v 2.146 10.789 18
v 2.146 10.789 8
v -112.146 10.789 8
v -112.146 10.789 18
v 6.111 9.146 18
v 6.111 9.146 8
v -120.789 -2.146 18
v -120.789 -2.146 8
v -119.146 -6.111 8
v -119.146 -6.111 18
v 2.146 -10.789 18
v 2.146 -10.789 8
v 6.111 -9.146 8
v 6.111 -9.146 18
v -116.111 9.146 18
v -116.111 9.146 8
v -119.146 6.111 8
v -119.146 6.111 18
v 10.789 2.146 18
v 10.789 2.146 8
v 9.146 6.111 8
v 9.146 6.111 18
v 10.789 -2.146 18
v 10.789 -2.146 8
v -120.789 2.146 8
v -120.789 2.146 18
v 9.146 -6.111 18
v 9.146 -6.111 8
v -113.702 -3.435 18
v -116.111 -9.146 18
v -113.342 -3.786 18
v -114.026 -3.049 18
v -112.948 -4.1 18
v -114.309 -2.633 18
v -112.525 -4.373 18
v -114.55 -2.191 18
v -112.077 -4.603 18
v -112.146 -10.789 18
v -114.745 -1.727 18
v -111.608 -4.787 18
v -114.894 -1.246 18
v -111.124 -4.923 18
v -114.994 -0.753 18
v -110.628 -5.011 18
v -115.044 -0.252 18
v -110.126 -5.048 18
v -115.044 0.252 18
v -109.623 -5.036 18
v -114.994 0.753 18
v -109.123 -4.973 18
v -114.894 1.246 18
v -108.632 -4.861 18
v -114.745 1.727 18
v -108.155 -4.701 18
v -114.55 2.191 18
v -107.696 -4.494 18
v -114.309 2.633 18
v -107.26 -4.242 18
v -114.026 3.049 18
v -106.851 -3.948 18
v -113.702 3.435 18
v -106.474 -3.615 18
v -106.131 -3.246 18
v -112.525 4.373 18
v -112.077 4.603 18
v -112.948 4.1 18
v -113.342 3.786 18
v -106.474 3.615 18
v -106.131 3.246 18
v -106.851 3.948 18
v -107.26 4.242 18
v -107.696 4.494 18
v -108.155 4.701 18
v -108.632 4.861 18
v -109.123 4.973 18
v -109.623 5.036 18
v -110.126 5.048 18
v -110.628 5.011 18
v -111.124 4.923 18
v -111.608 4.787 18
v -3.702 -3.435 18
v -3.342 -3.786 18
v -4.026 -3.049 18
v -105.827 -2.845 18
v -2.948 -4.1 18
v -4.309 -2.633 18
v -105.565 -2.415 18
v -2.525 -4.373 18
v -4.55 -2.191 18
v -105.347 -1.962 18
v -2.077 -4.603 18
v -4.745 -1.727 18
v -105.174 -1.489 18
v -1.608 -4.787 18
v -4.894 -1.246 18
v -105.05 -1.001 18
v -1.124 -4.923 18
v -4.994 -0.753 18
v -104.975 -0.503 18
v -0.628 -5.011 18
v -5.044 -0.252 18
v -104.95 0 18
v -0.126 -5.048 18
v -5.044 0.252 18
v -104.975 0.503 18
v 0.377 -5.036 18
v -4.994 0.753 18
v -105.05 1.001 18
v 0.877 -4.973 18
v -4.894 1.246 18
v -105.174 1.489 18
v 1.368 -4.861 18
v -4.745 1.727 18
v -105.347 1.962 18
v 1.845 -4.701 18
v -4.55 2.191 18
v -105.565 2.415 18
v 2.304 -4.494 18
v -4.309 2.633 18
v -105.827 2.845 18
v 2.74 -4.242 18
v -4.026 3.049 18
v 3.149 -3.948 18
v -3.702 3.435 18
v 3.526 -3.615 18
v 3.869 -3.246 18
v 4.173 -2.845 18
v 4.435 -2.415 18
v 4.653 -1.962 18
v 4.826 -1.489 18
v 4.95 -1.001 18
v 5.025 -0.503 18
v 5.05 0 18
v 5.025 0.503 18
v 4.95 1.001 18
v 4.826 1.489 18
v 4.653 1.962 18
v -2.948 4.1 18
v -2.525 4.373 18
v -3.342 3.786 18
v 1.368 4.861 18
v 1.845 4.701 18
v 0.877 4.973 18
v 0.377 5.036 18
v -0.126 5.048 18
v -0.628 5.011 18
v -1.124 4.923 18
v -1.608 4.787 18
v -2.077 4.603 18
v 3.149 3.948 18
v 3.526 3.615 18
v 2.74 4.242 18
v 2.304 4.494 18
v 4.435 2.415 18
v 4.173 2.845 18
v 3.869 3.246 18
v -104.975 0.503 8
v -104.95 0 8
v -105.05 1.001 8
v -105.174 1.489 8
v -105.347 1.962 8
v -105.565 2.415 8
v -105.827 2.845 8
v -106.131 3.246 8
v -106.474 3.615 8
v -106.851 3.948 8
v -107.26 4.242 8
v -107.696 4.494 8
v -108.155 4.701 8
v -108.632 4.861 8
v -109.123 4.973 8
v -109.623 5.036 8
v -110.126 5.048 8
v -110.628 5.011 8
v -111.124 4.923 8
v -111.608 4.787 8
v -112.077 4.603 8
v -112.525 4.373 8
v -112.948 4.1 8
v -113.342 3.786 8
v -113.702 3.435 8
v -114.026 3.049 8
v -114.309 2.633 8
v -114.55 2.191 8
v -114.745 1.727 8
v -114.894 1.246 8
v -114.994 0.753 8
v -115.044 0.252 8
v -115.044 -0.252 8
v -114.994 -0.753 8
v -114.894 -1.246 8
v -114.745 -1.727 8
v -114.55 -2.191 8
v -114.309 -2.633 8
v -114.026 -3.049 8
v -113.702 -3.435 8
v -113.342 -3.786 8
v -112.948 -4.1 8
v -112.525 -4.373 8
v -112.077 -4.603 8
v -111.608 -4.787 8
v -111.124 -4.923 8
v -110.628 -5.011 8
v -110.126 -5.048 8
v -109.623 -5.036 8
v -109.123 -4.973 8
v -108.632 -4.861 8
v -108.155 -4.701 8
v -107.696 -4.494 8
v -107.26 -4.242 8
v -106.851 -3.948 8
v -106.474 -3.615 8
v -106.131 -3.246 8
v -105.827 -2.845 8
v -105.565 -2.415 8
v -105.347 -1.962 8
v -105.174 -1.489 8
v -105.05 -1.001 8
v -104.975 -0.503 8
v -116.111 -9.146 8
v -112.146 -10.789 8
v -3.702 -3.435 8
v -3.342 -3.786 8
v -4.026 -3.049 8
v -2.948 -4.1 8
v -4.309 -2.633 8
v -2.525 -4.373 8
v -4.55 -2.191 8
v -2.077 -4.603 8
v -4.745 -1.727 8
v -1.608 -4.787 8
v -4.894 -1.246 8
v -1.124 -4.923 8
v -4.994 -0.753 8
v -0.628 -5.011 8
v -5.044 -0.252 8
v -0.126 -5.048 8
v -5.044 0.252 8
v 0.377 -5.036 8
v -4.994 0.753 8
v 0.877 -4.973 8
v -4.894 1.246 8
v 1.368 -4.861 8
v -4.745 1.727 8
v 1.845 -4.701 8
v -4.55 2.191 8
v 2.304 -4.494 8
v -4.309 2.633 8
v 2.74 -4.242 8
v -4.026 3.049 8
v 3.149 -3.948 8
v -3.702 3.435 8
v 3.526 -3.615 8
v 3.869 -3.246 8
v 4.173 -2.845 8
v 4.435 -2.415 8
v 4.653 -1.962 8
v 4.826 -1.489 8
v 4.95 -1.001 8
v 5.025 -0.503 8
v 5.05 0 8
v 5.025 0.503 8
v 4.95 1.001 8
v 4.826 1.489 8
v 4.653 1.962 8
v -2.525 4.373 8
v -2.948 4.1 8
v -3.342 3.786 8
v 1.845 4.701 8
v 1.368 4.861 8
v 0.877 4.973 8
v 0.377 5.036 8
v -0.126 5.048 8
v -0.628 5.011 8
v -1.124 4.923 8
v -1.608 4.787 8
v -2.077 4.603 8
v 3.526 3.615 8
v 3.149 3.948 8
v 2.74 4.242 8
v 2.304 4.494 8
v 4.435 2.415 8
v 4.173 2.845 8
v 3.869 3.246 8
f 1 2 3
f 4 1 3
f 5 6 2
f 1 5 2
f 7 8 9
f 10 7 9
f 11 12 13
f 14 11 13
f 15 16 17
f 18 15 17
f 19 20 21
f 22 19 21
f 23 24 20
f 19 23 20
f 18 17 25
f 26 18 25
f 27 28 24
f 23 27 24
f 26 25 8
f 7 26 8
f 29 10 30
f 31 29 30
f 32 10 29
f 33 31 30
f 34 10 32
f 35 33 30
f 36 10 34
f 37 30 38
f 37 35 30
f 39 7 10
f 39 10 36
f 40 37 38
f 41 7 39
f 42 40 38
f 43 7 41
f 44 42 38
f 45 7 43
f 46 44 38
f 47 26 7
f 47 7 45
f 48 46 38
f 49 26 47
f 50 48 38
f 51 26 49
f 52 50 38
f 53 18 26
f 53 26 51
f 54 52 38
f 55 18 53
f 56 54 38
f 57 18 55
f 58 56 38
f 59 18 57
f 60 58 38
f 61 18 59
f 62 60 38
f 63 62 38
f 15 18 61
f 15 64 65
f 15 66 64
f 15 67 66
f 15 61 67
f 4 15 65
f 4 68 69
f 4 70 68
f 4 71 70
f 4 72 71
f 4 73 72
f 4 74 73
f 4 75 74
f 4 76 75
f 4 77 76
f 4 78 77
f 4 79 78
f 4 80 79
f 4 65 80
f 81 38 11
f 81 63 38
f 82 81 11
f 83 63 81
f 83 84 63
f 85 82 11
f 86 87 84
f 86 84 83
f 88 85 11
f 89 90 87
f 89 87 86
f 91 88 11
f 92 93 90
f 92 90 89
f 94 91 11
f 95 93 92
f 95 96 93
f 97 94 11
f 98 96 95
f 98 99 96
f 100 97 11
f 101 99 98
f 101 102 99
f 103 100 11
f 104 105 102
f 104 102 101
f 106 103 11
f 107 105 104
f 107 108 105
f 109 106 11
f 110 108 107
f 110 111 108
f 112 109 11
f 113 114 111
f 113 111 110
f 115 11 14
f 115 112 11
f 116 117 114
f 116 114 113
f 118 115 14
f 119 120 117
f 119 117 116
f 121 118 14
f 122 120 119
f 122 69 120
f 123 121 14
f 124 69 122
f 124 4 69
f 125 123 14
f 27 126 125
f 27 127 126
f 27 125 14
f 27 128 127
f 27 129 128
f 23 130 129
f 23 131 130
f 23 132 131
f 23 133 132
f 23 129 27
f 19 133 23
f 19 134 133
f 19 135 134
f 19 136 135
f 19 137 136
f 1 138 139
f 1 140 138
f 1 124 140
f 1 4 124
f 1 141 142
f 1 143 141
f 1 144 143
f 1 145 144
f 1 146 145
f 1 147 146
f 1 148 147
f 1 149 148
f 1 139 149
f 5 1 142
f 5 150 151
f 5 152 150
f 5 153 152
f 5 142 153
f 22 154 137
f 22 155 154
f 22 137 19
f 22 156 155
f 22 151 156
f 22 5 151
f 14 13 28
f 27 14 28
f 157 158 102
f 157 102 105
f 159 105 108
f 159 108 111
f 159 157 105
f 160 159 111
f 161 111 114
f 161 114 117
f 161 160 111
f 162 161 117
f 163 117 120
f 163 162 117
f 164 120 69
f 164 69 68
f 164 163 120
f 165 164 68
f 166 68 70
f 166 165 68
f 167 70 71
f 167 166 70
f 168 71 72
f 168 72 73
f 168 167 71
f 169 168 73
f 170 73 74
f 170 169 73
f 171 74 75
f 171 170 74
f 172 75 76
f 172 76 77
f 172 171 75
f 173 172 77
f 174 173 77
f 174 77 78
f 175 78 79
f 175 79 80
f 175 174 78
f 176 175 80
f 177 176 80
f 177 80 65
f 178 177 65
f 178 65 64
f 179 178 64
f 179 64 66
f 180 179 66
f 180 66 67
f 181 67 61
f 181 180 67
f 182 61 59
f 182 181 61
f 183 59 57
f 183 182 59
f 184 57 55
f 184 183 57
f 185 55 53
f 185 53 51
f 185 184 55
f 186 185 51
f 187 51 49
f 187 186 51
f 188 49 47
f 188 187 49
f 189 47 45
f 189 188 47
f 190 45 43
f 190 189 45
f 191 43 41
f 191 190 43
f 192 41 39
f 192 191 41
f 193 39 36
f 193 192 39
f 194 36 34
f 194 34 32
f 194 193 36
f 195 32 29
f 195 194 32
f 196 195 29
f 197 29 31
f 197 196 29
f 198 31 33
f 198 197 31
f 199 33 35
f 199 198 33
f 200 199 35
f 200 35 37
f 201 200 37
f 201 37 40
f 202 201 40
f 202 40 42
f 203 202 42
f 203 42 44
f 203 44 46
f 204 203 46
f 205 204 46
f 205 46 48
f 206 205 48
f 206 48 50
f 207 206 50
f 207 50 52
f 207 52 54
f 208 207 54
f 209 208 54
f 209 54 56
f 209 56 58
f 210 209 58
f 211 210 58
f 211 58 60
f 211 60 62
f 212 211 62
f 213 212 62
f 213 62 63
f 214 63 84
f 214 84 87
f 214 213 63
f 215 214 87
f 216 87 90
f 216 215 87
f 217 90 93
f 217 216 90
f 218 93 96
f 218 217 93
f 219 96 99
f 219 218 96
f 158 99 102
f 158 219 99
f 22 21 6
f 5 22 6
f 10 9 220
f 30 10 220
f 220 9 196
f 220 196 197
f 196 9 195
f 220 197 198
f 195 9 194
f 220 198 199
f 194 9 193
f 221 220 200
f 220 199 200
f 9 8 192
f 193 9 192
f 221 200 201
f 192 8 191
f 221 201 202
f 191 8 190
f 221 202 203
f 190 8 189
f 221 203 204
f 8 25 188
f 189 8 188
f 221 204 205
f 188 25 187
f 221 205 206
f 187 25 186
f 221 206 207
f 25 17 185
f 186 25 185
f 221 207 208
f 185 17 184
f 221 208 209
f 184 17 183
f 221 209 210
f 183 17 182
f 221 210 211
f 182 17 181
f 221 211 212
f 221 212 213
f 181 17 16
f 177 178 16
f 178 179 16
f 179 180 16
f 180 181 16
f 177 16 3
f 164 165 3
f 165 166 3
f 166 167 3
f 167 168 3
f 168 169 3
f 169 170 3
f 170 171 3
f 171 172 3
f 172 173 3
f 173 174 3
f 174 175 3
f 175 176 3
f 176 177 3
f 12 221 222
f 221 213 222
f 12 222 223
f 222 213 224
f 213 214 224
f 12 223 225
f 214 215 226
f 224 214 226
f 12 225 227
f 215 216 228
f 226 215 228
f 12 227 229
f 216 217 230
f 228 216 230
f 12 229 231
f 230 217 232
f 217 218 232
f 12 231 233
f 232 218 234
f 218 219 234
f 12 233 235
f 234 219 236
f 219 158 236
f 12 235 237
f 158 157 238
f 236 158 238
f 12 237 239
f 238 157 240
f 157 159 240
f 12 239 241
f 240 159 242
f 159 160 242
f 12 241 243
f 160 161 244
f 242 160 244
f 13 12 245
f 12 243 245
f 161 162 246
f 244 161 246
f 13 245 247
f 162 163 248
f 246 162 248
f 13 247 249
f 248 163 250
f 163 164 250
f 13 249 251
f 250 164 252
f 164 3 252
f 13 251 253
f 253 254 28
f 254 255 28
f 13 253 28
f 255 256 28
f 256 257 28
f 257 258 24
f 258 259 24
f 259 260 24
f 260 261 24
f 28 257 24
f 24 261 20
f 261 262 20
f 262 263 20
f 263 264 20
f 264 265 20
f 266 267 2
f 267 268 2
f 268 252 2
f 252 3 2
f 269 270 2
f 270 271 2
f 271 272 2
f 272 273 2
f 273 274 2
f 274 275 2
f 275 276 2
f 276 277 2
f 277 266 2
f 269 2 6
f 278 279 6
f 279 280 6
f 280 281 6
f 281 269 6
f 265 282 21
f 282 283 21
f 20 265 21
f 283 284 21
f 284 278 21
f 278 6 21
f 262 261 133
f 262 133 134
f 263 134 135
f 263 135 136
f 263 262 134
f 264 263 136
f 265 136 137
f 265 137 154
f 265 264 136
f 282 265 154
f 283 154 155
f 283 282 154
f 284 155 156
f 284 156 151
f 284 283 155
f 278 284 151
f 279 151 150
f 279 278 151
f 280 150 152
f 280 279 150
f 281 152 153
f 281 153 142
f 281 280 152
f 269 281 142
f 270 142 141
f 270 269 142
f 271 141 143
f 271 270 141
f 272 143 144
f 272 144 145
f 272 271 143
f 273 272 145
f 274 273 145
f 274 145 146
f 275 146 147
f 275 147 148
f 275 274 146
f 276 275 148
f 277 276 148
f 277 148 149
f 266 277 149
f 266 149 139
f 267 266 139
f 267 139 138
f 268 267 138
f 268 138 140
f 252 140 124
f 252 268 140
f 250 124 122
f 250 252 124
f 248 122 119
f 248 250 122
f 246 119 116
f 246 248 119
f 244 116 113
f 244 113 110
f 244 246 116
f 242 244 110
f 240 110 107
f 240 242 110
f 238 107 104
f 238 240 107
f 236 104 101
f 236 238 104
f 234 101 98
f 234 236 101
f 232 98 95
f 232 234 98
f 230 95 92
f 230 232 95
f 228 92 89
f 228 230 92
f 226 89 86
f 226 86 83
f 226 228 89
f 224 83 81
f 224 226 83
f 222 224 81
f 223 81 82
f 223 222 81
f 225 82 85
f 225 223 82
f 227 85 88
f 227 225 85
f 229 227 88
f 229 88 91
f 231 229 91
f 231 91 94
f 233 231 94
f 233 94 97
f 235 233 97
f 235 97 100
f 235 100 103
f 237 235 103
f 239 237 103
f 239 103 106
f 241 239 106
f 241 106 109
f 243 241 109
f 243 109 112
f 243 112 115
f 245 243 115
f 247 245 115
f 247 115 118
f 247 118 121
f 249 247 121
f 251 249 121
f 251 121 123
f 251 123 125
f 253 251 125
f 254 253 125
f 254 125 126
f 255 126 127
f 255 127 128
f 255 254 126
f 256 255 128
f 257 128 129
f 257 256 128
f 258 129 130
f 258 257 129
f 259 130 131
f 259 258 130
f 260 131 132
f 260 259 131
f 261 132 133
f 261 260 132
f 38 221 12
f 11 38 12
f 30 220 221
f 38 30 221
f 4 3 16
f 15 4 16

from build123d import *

# Parameters (mm, degrees)
PASSIVE_ARM_START = 8
PROFILE_1_R       = 5.05
PASSIVE_ARM_DEPTH = 10


with BuildPart() as part:
    # Profile_1 → Passive_arm (new body)
    with BuildSketch(Plane.XY.offset(PASSIVE_ARM_START)):
        Polygon((9.146165735, 6.111272563), (6.111272563, 9.146165735), (2.145993542, 10.788638084), (-112.145993542, 10.788638084), (-116.111272563, 9.146165735), (-119.146165735, 6.111272563), (-120.788638084, 2.145993542), (-120.788638084, -2.145993542), (-119.146165735, -6.111272563), (-116.111272563, -9.146165735), (-112.145993542, -10.788638084), (2.145993542, -10.788638084), (6.111272563, -9.146165735), (9.146165735, -6.111272563), (10.788638084, -2.145993542), (10.788638084, 2.145993542), align=None)
        Circle(PROFILE_1_R, mode=Mode.SUBTRACT)
        with Locations((-110, 0)):
            Circle(PROFILE_1_R, mode=Mode.SUBTRACT)
    extrude(amount=PASSIVE_ARM_DEPTH)


solid = part.part
